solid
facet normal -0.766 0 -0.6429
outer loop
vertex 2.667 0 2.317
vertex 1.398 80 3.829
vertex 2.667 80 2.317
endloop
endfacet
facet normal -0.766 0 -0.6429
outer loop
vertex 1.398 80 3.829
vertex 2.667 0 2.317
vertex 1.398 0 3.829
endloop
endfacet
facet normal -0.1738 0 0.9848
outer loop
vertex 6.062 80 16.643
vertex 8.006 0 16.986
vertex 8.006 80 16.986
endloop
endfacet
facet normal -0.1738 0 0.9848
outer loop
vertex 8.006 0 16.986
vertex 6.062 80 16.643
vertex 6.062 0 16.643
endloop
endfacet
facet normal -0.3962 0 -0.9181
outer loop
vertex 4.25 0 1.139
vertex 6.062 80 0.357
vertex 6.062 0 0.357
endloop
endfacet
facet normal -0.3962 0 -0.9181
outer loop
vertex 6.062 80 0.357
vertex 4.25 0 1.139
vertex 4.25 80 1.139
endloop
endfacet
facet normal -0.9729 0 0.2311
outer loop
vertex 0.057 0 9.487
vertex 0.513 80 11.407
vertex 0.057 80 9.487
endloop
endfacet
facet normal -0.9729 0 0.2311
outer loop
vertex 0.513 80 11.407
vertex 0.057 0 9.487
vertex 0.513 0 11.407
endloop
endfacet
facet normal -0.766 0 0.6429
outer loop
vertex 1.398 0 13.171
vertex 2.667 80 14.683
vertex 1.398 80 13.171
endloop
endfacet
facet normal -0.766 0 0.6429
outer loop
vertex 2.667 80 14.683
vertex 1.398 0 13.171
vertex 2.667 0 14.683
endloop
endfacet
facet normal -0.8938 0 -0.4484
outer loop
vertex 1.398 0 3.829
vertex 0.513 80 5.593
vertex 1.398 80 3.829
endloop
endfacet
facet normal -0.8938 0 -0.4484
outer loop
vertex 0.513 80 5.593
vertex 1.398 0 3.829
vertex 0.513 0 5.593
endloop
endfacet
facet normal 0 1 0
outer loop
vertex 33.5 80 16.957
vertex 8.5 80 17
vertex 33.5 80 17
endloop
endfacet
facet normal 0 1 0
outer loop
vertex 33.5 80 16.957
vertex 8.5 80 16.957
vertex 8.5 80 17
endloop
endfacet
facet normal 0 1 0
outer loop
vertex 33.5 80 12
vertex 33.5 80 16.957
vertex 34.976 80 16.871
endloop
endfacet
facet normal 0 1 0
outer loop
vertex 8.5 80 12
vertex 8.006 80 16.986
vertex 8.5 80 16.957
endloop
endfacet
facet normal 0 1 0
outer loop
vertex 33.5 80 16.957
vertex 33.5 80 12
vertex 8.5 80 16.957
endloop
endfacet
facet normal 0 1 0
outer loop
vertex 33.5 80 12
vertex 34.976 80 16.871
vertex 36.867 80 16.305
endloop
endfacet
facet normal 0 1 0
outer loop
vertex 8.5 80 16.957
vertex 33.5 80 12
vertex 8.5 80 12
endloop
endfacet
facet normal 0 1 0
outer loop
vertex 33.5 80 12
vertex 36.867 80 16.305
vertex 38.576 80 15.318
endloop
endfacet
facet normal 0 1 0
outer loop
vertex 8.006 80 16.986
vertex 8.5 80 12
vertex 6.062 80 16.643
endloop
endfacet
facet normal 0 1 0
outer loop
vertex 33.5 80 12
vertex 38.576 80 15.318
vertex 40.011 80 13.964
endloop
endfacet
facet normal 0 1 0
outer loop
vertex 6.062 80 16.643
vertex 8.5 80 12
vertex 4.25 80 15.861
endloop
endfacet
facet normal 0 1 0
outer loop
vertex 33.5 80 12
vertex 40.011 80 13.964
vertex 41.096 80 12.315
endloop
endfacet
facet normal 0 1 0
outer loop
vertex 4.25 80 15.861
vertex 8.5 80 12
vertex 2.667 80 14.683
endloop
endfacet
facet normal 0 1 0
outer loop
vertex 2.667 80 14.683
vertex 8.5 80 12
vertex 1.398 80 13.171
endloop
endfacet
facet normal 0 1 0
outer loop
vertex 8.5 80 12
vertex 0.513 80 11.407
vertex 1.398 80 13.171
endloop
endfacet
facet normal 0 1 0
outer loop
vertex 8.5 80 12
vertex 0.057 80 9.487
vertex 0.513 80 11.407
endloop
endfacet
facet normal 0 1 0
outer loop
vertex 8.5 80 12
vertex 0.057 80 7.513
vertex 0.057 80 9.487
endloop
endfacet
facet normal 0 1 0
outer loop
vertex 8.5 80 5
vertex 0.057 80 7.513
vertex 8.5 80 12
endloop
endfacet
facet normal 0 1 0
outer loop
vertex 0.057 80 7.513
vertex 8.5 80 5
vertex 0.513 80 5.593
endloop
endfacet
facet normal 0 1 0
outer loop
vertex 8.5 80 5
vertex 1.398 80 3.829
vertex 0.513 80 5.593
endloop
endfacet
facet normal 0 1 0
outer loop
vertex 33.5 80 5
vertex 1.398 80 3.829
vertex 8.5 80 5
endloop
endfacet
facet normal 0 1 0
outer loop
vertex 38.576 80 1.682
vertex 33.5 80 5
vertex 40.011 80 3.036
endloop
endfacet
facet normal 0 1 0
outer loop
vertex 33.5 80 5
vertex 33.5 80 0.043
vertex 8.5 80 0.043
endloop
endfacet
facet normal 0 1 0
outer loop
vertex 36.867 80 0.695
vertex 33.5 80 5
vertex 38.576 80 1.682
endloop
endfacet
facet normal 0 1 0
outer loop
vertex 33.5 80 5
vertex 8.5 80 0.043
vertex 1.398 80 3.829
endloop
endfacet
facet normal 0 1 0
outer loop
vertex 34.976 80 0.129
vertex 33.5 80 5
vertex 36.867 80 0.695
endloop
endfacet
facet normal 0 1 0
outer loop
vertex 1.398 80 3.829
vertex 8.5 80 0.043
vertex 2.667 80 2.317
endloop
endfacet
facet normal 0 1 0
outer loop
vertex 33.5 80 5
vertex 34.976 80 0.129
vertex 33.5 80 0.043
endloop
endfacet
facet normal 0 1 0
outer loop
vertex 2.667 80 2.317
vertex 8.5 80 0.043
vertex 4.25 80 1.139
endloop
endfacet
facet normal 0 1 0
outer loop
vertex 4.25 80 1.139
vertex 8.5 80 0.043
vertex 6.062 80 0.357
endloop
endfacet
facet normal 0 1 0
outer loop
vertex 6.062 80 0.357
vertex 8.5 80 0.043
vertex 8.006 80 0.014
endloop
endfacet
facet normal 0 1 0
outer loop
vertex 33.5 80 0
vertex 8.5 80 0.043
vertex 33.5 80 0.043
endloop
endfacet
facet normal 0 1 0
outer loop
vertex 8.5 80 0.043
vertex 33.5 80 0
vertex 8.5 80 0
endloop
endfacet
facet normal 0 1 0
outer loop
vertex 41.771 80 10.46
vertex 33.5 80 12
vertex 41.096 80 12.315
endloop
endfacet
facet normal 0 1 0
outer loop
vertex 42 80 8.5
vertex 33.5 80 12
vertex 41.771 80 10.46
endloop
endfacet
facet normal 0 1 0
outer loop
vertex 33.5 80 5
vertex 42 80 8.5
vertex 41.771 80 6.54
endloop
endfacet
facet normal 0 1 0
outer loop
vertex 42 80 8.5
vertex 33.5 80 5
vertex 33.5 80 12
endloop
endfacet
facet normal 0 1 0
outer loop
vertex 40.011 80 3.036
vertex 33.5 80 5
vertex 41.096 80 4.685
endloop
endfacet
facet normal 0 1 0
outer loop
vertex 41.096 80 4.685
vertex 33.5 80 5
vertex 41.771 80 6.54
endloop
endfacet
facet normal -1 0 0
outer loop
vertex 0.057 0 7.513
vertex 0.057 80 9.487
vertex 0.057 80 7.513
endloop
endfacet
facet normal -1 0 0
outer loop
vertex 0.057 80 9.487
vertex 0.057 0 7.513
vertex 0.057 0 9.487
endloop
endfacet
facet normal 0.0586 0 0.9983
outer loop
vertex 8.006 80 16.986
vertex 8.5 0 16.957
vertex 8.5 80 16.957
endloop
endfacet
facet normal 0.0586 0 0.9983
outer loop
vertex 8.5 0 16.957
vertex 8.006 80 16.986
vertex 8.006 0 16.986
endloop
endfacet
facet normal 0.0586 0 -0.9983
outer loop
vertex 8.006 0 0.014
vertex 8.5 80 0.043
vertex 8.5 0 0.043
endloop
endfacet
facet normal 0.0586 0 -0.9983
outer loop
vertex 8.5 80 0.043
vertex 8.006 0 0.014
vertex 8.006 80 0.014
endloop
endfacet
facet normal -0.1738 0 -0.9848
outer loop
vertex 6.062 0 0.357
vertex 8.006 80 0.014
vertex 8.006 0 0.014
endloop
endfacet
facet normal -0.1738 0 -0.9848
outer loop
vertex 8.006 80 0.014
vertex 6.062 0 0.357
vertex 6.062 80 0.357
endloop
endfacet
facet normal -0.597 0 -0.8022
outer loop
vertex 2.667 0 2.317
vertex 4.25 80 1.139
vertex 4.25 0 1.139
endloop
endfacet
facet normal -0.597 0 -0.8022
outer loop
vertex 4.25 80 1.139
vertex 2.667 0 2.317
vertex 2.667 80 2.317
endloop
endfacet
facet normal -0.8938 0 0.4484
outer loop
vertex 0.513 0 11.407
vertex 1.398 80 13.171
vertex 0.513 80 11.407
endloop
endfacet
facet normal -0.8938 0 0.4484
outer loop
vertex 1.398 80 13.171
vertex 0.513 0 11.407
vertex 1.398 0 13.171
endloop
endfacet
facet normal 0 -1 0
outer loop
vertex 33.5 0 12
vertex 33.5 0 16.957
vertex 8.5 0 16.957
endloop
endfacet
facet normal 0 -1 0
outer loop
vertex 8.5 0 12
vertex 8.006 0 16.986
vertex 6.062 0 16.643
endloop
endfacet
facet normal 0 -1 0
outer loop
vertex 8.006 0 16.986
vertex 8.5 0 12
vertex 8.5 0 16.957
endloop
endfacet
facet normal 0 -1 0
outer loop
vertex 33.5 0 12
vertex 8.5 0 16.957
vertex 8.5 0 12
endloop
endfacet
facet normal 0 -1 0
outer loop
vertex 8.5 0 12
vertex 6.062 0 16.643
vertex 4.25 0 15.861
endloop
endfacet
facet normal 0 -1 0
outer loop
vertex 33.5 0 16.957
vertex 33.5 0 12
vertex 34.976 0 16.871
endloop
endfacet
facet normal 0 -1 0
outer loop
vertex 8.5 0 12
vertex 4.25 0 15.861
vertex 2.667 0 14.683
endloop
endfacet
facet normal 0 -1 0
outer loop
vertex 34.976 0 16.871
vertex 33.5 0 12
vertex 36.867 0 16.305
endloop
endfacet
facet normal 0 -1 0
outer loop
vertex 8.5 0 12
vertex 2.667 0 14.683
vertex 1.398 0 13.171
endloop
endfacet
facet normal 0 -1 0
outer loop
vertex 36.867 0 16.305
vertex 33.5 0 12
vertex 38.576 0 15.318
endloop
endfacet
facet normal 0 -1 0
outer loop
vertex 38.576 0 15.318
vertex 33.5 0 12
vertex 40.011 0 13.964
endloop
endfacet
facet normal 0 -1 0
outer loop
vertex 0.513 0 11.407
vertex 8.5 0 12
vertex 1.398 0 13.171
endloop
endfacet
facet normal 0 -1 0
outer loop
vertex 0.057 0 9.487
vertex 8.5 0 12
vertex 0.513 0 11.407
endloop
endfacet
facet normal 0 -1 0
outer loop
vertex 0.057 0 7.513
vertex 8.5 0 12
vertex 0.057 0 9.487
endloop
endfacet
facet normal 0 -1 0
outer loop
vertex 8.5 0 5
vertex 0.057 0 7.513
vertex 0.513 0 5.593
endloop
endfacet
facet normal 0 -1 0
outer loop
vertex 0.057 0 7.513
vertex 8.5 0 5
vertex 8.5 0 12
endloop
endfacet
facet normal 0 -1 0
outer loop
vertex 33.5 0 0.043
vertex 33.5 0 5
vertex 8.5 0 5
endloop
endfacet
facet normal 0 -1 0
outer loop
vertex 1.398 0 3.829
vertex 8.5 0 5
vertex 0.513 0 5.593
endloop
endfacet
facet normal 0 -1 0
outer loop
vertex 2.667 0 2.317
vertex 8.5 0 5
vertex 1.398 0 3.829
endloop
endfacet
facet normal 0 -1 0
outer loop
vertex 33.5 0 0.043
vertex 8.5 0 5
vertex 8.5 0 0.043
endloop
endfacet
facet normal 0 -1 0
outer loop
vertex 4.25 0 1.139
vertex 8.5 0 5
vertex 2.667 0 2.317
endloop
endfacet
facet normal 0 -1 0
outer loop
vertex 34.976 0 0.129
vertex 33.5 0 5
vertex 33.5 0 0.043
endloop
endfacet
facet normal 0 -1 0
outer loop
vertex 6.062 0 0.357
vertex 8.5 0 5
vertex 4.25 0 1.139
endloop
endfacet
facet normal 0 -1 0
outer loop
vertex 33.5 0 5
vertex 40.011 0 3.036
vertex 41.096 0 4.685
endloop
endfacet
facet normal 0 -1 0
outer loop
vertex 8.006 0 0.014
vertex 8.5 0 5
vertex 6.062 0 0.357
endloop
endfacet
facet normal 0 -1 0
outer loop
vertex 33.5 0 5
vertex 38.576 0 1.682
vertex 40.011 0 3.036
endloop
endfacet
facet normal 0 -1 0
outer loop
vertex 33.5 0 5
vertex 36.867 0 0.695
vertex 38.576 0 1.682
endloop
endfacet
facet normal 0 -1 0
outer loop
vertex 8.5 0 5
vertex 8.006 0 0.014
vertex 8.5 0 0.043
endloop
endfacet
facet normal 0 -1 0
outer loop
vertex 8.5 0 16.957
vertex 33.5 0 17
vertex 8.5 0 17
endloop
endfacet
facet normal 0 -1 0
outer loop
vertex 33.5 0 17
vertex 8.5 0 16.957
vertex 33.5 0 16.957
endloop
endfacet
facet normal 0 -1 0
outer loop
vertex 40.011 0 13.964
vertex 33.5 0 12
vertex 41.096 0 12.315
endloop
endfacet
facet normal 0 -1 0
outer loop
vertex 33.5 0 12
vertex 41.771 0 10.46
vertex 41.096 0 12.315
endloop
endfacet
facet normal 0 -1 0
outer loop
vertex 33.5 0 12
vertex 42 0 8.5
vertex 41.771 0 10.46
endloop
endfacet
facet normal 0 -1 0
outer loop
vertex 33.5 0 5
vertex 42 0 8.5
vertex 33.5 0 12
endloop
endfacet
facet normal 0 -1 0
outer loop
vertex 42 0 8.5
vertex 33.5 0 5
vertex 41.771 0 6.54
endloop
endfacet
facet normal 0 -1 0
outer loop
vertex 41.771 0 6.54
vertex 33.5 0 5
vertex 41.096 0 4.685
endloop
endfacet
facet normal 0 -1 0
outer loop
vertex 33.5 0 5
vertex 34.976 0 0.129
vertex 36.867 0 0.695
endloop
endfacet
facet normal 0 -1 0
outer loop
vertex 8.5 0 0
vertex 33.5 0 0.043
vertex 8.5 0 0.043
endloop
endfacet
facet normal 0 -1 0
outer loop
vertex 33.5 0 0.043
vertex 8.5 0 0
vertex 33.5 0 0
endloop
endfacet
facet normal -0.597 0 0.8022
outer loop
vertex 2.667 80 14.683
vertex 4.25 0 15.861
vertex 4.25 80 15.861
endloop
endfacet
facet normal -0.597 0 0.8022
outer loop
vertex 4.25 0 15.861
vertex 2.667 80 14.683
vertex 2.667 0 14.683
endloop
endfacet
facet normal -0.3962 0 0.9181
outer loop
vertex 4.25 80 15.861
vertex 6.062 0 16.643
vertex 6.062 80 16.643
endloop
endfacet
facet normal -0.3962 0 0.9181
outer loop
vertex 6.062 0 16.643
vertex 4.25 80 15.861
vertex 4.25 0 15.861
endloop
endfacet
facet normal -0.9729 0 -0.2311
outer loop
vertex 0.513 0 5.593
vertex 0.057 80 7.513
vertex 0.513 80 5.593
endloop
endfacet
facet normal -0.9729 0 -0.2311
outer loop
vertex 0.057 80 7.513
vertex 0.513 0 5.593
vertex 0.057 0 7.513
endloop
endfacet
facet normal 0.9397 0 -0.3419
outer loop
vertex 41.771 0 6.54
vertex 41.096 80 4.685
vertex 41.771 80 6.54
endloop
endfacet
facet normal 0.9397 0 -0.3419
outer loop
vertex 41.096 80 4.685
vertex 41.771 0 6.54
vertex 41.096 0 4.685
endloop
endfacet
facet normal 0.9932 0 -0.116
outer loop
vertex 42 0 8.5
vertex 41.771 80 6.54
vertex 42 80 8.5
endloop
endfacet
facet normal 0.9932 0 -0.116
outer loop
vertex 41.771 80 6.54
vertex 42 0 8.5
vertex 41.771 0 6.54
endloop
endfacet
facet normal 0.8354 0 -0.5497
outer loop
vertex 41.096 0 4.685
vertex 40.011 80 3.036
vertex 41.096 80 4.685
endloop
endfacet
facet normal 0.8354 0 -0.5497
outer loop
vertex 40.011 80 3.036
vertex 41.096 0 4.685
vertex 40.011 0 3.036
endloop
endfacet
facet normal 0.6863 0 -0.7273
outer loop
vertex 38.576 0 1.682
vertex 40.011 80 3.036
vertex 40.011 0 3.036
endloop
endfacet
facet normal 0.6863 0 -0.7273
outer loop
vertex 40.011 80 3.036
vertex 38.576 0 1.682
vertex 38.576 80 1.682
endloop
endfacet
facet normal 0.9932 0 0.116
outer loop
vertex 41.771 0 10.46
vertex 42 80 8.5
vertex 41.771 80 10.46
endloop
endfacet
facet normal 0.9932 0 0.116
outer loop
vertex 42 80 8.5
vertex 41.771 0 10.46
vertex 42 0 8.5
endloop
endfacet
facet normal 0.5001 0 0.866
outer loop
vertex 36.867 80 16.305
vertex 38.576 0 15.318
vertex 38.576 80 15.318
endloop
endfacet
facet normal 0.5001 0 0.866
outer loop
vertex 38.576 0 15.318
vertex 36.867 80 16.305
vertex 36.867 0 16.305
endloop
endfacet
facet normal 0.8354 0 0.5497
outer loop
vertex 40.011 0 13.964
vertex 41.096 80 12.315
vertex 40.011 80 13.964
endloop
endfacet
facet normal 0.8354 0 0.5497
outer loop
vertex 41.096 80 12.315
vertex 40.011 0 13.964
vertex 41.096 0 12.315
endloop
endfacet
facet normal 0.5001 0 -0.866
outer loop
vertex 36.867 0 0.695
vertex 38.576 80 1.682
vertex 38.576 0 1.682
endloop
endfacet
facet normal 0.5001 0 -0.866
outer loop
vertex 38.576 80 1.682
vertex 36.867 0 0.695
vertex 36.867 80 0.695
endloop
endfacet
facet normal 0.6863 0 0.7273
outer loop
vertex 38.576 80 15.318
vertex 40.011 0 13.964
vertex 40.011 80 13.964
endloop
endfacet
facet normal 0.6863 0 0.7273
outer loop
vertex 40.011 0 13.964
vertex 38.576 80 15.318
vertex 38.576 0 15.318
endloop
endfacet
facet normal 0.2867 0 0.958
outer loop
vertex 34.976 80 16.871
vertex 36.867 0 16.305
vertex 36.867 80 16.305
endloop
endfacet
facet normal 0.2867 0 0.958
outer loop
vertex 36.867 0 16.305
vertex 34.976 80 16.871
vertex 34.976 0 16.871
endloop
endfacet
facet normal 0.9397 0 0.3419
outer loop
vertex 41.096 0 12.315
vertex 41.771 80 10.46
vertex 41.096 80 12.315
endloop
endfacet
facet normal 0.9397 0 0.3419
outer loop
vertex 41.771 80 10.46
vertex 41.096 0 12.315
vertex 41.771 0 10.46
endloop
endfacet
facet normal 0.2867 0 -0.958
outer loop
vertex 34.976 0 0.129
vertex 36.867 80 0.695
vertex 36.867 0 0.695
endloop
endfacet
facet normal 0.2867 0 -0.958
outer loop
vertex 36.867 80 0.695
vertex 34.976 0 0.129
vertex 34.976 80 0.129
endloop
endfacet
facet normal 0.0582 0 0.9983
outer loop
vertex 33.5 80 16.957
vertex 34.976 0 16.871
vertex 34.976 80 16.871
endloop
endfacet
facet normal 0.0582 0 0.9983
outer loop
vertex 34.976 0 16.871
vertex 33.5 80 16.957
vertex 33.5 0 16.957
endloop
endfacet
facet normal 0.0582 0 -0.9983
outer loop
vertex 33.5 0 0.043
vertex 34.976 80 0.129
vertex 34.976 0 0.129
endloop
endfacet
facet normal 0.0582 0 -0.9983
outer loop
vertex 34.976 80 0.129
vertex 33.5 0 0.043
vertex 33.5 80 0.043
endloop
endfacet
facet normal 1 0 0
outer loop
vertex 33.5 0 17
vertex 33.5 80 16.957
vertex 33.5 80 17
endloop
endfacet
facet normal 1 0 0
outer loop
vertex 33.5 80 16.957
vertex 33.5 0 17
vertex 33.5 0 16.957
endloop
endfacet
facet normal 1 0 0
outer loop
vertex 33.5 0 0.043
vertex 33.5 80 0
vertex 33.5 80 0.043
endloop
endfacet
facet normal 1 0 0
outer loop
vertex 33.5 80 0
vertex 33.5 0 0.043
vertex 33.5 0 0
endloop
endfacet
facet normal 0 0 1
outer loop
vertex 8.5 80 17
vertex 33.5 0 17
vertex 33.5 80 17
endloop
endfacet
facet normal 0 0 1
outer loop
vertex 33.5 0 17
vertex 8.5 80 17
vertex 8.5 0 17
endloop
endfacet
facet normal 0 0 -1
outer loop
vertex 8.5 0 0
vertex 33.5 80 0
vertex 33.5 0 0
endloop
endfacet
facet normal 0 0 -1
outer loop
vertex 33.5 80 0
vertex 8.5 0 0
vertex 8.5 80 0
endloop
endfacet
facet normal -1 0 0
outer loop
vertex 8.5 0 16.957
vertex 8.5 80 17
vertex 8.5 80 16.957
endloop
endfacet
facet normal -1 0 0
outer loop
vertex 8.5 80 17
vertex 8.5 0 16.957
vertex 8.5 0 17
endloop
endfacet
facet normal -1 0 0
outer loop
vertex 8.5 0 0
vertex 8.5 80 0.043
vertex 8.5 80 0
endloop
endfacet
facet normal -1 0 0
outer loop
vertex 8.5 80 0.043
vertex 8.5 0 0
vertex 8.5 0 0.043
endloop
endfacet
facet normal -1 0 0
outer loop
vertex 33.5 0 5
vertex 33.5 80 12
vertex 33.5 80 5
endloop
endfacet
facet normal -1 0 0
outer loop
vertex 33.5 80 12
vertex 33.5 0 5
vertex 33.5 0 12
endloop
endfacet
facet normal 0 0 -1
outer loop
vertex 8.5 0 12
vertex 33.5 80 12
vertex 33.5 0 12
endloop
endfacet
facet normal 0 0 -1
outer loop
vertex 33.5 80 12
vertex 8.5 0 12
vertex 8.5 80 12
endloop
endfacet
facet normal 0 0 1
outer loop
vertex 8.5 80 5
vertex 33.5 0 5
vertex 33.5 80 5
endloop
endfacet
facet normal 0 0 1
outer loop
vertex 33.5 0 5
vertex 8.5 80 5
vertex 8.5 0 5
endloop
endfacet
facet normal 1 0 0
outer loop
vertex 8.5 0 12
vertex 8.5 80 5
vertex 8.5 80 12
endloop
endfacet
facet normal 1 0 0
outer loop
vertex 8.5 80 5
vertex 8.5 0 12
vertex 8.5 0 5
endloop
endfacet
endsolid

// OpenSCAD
thickness = 5;
height = 7;
width = 25;
length = 80;
difference() {
    union() {
        translate ([((thickness*2)+height)/2,0,((thickness*2)+height)/2]) rotate([-90,0,0]) {cylinder(length,((thickness*2)+height)/2,((thickness*2)+height)/2);}; // left side
        translate ([(((thickness*2)+height)/2)+width,0,((thickness*2)+height)/2]) rotate([-90,0,0]) {cylinder(length,((thickness*2)+height)/2,((thickness*2)+height)/2);}; //right side
        translate ([((thickness*2)+height)/2,0,0]) cube([width,length,height+(thickness*2)]); // outer shell
    }
   translate ([((thickness*2)+height)/2,0,thickness]) cube([width,length,height]); //cavity
}
